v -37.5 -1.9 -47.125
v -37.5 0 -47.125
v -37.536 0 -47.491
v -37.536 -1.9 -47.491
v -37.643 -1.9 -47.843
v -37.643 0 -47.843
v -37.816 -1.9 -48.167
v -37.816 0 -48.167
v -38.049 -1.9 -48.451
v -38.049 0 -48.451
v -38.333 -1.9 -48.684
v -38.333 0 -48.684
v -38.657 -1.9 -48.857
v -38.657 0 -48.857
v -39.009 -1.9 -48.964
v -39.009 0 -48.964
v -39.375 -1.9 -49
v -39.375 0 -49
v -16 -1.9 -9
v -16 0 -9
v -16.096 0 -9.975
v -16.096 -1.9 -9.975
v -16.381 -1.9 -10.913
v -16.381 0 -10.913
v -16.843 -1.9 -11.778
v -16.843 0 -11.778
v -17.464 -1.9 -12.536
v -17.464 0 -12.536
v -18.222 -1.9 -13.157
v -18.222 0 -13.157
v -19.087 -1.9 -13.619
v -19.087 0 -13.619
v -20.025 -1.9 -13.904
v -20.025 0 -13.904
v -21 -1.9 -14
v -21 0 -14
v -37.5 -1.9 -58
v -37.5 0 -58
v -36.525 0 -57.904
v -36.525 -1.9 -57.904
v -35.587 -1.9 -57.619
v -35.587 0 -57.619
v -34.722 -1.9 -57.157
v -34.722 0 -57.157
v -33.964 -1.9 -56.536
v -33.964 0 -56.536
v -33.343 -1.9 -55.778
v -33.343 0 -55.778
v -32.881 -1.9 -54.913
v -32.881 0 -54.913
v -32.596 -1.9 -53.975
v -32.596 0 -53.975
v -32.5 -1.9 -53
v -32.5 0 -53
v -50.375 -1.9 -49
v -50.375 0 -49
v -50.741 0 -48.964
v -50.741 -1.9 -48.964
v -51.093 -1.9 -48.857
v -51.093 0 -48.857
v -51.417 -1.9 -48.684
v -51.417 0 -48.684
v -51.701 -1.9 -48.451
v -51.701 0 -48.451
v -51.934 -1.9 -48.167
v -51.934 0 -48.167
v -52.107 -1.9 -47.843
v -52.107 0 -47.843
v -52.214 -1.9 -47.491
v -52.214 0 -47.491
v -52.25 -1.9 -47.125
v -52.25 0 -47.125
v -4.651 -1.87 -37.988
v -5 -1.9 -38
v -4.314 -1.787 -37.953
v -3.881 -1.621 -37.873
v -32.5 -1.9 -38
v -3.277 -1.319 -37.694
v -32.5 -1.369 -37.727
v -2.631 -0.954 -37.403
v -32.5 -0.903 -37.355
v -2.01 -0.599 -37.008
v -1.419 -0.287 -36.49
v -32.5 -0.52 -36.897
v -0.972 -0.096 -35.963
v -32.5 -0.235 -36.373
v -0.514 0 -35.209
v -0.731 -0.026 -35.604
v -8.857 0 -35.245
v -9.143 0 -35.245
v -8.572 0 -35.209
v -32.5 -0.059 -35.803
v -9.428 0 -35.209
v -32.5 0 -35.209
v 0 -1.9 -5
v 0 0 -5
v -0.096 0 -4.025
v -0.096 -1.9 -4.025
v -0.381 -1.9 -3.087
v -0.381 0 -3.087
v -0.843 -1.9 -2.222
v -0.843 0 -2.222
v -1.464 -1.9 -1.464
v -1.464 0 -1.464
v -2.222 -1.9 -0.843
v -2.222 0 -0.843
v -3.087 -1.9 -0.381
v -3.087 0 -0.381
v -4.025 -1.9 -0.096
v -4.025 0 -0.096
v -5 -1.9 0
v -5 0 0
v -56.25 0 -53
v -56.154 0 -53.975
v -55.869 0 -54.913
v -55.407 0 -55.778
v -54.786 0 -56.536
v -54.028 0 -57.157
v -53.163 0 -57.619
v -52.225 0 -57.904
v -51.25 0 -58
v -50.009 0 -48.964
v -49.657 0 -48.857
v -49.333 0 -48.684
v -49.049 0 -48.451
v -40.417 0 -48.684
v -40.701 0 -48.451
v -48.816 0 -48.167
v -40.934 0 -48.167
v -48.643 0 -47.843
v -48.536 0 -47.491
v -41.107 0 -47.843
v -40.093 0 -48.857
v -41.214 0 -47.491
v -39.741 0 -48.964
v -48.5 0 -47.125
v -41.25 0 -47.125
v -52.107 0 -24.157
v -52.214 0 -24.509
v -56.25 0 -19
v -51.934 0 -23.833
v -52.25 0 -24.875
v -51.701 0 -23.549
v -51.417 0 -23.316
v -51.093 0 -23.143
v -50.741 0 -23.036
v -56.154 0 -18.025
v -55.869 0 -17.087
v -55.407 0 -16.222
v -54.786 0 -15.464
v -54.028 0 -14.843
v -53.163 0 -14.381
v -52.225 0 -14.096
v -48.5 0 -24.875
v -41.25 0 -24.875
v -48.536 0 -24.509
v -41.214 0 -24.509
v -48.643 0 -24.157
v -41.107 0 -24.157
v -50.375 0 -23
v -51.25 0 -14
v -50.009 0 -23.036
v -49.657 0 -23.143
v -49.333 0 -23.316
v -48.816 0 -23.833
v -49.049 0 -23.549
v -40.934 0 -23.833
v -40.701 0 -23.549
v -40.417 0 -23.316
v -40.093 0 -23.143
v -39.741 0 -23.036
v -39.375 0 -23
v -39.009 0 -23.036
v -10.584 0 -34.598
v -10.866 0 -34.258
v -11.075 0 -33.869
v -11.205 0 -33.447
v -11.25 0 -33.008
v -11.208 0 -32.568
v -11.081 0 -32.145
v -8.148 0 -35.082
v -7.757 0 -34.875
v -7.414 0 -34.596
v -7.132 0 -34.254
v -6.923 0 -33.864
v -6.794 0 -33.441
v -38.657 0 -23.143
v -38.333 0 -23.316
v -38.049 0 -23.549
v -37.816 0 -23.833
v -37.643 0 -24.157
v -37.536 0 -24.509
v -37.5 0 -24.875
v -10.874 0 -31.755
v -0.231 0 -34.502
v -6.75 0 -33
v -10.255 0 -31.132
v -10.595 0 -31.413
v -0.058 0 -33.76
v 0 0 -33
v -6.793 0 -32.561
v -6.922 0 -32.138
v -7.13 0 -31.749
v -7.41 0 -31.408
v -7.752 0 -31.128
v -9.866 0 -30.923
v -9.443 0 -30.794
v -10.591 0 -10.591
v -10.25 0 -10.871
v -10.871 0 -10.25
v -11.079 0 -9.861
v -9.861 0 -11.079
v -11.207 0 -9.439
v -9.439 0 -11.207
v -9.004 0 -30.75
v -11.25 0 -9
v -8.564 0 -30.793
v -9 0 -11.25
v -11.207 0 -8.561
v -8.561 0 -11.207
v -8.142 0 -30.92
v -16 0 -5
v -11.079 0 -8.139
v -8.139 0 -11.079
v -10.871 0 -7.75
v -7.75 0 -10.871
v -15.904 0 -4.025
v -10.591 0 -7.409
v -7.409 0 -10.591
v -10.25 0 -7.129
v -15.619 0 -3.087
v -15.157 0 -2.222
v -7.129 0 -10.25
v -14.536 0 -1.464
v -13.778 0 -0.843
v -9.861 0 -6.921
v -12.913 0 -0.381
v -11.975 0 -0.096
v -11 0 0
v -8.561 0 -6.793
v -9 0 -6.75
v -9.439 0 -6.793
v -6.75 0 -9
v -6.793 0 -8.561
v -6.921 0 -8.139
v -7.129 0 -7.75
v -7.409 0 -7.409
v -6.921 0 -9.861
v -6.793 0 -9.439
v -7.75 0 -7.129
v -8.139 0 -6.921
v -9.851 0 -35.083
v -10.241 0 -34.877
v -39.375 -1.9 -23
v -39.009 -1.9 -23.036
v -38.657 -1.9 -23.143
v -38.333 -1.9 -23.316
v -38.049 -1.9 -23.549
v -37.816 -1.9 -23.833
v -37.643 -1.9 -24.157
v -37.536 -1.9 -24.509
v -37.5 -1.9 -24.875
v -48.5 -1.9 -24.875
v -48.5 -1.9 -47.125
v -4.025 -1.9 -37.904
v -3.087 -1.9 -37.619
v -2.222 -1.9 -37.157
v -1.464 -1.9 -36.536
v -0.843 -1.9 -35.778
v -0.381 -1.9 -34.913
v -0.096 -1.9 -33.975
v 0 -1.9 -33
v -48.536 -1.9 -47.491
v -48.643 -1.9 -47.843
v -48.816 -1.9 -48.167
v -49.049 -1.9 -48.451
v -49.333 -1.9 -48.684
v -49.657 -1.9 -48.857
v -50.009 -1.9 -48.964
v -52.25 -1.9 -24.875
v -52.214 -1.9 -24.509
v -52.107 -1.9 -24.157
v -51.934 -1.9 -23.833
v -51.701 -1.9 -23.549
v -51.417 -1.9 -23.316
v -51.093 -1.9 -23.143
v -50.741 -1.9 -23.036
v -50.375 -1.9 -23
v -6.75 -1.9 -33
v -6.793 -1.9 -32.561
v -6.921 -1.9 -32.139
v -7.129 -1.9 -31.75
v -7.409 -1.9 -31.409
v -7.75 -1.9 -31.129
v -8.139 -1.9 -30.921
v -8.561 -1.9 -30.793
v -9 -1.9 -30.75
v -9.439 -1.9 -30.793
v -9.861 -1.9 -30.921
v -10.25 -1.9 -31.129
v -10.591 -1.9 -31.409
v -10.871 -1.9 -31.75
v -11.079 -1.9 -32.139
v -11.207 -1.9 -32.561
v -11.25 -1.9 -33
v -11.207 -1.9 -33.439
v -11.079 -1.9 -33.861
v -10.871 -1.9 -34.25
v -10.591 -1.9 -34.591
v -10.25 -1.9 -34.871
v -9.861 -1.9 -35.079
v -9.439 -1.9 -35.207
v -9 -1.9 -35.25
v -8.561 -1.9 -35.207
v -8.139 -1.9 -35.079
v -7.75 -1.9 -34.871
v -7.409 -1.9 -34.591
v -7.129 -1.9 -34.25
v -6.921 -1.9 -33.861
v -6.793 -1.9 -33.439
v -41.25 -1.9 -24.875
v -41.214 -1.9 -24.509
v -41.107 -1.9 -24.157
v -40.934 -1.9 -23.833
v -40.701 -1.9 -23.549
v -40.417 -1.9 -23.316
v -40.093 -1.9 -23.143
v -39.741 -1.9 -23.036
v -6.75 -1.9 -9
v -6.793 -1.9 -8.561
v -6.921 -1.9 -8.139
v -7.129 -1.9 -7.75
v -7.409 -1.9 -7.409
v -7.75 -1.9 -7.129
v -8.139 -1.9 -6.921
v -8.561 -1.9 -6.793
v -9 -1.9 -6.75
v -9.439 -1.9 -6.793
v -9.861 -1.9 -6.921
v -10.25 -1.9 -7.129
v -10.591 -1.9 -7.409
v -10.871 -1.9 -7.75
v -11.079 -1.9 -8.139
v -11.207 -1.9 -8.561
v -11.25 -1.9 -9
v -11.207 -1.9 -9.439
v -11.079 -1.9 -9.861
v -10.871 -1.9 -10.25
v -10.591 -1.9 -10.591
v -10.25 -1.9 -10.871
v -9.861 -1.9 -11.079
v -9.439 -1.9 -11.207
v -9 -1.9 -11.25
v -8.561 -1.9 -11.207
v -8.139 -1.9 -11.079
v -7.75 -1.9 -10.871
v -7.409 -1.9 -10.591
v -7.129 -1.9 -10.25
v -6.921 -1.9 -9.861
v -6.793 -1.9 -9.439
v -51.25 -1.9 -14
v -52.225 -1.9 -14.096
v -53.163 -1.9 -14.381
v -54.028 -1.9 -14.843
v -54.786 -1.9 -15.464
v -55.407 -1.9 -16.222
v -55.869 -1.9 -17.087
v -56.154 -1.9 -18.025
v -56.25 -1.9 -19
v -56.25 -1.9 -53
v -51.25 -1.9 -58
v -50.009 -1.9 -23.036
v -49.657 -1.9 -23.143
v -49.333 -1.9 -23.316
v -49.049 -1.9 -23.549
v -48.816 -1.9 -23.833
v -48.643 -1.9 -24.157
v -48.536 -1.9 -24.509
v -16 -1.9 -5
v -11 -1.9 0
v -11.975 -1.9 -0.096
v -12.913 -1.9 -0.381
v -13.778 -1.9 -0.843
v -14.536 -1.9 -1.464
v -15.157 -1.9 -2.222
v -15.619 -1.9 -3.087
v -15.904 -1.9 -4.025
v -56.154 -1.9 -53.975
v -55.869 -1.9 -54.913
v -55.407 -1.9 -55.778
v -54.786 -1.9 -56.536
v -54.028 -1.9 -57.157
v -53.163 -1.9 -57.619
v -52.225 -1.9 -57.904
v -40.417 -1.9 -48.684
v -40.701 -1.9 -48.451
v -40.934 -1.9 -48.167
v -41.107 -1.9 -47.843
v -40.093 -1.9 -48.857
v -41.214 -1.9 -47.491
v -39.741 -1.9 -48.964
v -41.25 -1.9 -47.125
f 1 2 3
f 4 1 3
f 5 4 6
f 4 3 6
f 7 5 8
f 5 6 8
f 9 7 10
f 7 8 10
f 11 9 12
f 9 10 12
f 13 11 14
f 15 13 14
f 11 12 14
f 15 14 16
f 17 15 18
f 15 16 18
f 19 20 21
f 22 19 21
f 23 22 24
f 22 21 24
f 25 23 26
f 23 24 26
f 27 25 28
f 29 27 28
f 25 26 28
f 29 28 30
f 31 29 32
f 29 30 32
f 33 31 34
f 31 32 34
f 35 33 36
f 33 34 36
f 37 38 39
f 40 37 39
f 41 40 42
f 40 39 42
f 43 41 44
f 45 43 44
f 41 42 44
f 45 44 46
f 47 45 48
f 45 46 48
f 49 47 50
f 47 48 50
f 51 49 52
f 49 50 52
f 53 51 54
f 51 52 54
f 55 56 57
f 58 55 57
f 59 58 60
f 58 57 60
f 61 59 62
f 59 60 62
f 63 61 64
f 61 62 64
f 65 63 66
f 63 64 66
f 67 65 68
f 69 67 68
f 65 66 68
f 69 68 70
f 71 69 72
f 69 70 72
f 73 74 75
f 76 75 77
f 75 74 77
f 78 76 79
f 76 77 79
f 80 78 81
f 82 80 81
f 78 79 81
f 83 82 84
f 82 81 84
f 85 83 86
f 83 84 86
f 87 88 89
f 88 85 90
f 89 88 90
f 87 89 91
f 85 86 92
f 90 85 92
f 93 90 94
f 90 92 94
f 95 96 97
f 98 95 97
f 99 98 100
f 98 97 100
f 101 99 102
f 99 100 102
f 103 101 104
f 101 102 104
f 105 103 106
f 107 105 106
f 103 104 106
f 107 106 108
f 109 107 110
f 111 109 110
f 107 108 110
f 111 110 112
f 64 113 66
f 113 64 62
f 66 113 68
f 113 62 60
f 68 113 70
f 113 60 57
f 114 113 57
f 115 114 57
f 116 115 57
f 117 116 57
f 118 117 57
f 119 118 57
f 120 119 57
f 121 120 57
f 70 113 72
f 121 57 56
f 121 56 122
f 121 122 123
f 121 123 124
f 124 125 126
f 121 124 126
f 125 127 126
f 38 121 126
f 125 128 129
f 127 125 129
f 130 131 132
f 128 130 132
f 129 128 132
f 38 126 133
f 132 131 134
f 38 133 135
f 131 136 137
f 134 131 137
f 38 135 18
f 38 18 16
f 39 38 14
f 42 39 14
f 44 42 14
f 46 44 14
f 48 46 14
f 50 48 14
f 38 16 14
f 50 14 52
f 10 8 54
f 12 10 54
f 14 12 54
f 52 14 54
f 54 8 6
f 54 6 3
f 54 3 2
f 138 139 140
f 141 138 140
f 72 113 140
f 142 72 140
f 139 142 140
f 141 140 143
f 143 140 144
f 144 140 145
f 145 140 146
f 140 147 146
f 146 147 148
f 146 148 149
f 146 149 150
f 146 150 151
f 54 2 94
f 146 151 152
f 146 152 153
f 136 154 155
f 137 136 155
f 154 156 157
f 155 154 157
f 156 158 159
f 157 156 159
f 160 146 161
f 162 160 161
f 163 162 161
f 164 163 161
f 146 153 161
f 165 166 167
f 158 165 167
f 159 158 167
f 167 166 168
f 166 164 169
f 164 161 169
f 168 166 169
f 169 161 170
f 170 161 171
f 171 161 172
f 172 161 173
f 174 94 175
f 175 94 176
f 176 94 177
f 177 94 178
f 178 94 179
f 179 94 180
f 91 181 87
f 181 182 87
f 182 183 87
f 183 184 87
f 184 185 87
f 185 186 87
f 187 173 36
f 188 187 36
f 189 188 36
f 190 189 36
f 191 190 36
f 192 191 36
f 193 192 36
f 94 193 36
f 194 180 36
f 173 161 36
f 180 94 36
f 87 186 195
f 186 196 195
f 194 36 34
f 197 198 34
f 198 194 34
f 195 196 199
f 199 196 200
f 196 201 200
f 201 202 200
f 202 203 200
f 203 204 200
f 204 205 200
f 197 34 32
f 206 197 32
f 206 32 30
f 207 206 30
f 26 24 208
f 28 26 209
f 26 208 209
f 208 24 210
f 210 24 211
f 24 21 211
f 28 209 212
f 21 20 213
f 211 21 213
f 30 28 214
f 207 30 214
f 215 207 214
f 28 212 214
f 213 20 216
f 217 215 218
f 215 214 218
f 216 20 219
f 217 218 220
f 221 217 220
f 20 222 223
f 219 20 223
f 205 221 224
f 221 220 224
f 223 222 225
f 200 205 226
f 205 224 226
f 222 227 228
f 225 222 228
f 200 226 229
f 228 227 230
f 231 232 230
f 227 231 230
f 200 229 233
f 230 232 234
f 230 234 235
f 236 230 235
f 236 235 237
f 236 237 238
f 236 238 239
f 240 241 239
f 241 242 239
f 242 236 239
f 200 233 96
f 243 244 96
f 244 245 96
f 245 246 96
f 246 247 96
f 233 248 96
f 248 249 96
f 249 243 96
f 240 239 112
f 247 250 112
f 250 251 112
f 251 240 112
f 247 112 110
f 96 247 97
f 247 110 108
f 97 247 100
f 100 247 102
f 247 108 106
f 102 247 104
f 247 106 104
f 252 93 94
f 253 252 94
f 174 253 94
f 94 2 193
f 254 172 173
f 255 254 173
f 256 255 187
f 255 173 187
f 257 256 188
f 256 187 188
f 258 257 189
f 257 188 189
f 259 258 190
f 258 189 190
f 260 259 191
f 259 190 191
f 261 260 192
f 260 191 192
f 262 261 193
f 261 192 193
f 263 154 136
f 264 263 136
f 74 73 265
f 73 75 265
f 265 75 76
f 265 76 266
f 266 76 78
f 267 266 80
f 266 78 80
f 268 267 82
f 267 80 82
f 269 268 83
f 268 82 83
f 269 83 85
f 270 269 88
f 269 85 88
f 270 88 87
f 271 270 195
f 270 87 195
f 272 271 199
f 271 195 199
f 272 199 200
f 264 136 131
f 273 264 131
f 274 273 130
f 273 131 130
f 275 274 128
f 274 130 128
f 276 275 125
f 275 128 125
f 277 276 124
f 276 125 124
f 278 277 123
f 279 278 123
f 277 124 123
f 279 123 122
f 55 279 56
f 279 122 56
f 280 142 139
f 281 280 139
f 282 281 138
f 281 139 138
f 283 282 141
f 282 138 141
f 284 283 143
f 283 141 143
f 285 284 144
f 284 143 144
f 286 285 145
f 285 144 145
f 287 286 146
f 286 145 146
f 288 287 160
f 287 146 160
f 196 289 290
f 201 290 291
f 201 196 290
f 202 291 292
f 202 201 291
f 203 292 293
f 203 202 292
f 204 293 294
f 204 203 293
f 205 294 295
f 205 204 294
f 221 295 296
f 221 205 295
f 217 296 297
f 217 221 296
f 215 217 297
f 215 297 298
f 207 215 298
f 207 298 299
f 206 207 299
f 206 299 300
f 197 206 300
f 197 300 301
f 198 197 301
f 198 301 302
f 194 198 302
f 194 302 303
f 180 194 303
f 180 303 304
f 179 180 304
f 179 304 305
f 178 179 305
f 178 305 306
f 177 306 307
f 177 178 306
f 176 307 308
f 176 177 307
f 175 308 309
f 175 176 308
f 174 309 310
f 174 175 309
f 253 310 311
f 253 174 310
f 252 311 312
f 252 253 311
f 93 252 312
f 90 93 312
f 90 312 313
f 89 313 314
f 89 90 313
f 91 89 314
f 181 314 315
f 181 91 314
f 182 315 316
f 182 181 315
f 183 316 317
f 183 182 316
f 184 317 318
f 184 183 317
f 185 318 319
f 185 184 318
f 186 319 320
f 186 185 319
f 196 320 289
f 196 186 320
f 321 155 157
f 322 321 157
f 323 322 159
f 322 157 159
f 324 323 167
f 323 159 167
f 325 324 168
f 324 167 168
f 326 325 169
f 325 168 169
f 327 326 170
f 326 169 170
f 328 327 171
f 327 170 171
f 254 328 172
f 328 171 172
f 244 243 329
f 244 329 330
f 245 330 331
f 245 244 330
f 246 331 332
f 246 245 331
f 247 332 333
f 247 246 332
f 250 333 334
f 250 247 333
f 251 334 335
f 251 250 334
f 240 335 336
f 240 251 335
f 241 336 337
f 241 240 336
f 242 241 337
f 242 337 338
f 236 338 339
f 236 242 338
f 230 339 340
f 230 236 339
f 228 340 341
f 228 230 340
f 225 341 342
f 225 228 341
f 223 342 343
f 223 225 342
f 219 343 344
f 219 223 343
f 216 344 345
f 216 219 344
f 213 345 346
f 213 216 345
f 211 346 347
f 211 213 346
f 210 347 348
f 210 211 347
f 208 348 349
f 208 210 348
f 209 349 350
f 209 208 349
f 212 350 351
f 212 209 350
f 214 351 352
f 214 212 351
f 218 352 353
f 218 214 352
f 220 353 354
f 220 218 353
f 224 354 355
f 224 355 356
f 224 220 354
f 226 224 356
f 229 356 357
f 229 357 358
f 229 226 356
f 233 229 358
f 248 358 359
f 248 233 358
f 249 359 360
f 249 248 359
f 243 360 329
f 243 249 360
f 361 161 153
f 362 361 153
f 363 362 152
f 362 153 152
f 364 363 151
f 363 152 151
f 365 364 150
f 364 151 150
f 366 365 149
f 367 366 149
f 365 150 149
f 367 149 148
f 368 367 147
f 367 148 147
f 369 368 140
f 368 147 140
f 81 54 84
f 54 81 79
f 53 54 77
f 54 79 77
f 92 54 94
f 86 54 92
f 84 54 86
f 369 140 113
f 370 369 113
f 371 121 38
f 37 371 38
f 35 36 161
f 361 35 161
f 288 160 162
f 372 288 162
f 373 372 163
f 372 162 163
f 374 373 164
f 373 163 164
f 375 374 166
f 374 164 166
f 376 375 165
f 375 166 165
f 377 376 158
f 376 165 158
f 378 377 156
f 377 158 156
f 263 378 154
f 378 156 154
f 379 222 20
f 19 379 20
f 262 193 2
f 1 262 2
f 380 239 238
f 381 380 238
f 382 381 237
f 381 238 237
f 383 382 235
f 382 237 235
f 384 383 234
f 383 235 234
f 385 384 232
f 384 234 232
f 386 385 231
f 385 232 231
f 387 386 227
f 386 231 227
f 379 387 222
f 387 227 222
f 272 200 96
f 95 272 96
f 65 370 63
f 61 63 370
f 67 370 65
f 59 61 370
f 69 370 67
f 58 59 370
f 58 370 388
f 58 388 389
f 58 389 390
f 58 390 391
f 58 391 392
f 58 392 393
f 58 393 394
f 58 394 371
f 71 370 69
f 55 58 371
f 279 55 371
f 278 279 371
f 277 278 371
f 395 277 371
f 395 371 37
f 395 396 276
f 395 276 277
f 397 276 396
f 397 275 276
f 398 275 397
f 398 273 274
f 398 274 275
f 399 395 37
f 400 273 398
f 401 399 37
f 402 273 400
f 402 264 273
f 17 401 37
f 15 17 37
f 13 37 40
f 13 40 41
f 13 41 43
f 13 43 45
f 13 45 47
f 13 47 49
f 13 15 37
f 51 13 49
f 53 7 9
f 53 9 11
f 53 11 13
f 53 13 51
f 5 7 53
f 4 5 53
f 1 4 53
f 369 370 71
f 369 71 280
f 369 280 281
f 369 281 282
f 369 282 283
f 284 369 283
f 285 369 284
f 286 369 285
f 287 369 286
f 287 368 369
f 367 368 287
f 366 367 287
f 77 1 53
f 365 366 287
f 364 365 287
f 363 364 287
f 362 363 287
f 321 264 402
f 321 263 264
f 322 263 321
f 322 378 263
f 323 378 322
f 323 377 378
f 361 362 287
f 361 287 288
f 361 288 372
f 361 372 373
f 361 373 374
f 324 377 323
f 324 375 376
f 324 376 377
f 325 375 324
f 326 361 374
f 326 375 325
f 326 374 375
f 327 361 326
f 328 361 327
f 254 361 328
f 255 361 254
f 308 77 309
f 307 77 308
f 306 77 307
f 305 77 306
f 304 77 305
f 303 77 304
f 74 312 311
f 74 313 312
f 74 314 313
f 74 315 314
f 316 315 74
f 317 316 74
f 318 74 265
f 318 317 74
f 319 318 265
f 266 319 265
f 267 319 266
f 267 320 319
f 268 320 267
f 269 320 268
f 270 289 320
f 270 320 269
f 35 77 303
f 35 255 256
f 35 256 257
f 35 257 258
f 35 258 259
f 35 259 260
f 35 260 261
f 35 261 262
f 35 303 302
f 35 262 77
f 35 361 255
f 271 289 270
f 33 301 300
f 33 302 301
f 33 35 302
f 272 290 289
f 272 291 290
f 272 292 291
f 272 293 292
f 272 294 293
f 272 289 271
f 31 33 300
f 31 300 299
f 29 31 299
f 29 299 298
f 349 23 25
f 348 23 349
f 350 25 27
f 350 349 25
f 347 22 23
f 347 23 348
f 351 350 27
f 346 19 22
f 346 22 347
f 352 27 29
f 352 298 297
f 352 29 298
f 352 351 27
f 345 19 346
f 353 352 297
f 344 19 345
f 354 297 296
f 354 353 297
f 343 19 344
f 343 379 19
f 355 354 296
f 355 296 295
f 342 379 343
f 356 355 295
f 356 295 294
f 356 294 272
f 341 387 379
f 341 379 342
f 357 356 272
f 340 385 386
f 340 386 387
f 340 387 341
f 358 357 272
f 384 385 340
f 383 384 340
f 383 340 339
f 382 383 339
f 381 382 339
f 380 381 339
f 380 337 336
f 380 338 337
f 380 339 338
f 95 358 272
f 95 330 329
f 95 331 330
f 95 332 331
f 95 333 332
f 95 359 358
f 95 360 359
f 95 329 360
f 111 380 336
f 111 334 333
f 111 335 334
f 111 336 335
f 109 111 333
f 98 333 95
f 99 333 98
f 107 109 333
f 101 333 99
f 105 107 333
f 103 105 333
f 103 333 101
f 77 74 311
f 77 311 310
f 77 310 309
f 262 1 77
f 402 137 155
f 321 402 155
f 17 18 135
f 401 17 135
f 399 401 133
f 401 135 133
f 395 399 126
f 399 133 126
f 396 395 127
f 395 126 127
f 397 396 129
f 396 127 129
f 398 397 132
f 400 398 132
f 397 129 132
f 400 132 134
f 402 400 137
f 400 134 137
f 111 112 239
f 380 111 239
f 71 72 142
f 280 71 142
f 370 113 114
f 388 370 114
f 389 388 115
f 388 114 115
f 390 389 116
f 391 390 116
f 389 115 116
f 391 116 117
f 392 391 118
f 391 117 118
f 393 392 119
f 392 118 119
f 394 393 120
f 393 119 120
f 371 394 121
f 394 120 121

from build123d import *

# Parameters (mm, degrees)
F0_R        = 2.25
F1_DEPTH    = 1.9
F2_T1_DEPTH = 34.4776428685


# Not quite as in the source:
# - a fillet or chamfer that OpenCascade refuses, or shapes differently, is made with other operations: its cross-section is extruded or revolved along the edge and cut away or added


with BuildPart() as f1:
    # F0 (on Front) → F1 (new body)
    with BuildSketch(Plane.XZ):
        with BuildLine():
            Line((0, -33), (0, -5))
            ThreePointArc((0, -5), (-1.4644660941, -1.4644660941), (-5, 0))
            Line((-5, 0), (-11, 0))
            ThreePointArc((-11, 0), (-14.5355339059, -1.4644660941), (-16, -5))
            Line((-16, -5), (-16, -9))
            ThreePointArc((-16, -9), (-17.4644660941, -12.5355339059), (-21, -14))
            Line((-21, -14), (-51.25, -14))
            ThreePointArc((-51.25, -14), (-54.7855339059, -15.4644660941), (-56.25, -19))
            Line((-56.25, -19), (-56.25, -53))
            ThreePointArc((-56.25, -53), (-54.7855339059, -56.5355339059), (-51.25, -58))
            Line((-51.25, -58), (-37.5, -58))
            ThreePointArc((-37.5, -58), (-33.9644660941, -56.5355339059), (-32.5, -53))
            Line((-32.5, -53), (-32.5, -43))
            Line((-32.5, -43), (-32.5, -38))
            Line((-32.5, -38), (-27.5, -38))
            Line((-27.5, -38), (-5, -38))
            ThreePointArc((-5, -38), (-1.4644660941, -36.5355339059), (0, -33))
        make_face()
        with BuildLine():
            Line((-52.25, -47.125), (-52.25, -24.875))
            ThreePointArc((-52.25, -24.875), (-51.7008252147, -23.5491747853), (-50.375, -23))
            ThreePointArc((-50.375, -23), (-49.0491747853, -23.5491747853), (-48.5, -24.875))
            Line((-48.5, -24.875), (-48.5, -47.125))
            ThreePointArc((-48.5, -47.125), (-49.0491747853, -48.4508252147), (-50.375, -49))
            ThreePointArc((-50.375, -49), (-51.7008252147, -48.4508252147), (-52.25, -47.125))
        make_face(mode=Mode.SUBTRACT)
        with BuildLine():
            Line((-41.25, -47.125), (-41.25, -24.875))
            ThreePointArc((-41.25, -24.875), (-40.7008252147, -23.5491747853), (-39.375, -23))
            ThreePointArc((-39.375, -23), (-38.0491747853, -23.5491747853), (-37.5, -24.875))
            Line((-37.5, -24.875), (-37.5, -47.125))
            ThreePointArc((-37.5, -47.125), (-38.0491747853, -48.4508252147), (-39.375, -49))
            ThreePointArc((-39.375, -49), (-40.7008252147, -48.4508252147), (-41.25, -47.125))
        make_face(mode=Mode.SUBTRACT)
        with Locations((-9, -33)):
            Circle(F0_R, mode=Mode.SUBTRACT)
        with Locations((-9, -9)):
            Circle(F0_R, mode=Mode.SUBTRACT)
    extrude(amount=F1_DEPTH)

    # F2: fillet of radius 3 on 1 edges, made by hand

    # F2_s2 → F2_t1 (cut)
    with BuildSketch(Plane.YZ.offset(-32.5)):
        with BuildLine():
            ThreePointArc((-1.9, -38), (-0.5200806465, -36.8971371542), (0, -35.2089428526))
            Line((0, -35.2089428526), (0, -38))
            Line((0, -38), (-1.9, -38))
        make_face()
    extrude(amount=F2_T1_DEPTH, mode=Mode.SUBTRACT)


solid = f1.part
